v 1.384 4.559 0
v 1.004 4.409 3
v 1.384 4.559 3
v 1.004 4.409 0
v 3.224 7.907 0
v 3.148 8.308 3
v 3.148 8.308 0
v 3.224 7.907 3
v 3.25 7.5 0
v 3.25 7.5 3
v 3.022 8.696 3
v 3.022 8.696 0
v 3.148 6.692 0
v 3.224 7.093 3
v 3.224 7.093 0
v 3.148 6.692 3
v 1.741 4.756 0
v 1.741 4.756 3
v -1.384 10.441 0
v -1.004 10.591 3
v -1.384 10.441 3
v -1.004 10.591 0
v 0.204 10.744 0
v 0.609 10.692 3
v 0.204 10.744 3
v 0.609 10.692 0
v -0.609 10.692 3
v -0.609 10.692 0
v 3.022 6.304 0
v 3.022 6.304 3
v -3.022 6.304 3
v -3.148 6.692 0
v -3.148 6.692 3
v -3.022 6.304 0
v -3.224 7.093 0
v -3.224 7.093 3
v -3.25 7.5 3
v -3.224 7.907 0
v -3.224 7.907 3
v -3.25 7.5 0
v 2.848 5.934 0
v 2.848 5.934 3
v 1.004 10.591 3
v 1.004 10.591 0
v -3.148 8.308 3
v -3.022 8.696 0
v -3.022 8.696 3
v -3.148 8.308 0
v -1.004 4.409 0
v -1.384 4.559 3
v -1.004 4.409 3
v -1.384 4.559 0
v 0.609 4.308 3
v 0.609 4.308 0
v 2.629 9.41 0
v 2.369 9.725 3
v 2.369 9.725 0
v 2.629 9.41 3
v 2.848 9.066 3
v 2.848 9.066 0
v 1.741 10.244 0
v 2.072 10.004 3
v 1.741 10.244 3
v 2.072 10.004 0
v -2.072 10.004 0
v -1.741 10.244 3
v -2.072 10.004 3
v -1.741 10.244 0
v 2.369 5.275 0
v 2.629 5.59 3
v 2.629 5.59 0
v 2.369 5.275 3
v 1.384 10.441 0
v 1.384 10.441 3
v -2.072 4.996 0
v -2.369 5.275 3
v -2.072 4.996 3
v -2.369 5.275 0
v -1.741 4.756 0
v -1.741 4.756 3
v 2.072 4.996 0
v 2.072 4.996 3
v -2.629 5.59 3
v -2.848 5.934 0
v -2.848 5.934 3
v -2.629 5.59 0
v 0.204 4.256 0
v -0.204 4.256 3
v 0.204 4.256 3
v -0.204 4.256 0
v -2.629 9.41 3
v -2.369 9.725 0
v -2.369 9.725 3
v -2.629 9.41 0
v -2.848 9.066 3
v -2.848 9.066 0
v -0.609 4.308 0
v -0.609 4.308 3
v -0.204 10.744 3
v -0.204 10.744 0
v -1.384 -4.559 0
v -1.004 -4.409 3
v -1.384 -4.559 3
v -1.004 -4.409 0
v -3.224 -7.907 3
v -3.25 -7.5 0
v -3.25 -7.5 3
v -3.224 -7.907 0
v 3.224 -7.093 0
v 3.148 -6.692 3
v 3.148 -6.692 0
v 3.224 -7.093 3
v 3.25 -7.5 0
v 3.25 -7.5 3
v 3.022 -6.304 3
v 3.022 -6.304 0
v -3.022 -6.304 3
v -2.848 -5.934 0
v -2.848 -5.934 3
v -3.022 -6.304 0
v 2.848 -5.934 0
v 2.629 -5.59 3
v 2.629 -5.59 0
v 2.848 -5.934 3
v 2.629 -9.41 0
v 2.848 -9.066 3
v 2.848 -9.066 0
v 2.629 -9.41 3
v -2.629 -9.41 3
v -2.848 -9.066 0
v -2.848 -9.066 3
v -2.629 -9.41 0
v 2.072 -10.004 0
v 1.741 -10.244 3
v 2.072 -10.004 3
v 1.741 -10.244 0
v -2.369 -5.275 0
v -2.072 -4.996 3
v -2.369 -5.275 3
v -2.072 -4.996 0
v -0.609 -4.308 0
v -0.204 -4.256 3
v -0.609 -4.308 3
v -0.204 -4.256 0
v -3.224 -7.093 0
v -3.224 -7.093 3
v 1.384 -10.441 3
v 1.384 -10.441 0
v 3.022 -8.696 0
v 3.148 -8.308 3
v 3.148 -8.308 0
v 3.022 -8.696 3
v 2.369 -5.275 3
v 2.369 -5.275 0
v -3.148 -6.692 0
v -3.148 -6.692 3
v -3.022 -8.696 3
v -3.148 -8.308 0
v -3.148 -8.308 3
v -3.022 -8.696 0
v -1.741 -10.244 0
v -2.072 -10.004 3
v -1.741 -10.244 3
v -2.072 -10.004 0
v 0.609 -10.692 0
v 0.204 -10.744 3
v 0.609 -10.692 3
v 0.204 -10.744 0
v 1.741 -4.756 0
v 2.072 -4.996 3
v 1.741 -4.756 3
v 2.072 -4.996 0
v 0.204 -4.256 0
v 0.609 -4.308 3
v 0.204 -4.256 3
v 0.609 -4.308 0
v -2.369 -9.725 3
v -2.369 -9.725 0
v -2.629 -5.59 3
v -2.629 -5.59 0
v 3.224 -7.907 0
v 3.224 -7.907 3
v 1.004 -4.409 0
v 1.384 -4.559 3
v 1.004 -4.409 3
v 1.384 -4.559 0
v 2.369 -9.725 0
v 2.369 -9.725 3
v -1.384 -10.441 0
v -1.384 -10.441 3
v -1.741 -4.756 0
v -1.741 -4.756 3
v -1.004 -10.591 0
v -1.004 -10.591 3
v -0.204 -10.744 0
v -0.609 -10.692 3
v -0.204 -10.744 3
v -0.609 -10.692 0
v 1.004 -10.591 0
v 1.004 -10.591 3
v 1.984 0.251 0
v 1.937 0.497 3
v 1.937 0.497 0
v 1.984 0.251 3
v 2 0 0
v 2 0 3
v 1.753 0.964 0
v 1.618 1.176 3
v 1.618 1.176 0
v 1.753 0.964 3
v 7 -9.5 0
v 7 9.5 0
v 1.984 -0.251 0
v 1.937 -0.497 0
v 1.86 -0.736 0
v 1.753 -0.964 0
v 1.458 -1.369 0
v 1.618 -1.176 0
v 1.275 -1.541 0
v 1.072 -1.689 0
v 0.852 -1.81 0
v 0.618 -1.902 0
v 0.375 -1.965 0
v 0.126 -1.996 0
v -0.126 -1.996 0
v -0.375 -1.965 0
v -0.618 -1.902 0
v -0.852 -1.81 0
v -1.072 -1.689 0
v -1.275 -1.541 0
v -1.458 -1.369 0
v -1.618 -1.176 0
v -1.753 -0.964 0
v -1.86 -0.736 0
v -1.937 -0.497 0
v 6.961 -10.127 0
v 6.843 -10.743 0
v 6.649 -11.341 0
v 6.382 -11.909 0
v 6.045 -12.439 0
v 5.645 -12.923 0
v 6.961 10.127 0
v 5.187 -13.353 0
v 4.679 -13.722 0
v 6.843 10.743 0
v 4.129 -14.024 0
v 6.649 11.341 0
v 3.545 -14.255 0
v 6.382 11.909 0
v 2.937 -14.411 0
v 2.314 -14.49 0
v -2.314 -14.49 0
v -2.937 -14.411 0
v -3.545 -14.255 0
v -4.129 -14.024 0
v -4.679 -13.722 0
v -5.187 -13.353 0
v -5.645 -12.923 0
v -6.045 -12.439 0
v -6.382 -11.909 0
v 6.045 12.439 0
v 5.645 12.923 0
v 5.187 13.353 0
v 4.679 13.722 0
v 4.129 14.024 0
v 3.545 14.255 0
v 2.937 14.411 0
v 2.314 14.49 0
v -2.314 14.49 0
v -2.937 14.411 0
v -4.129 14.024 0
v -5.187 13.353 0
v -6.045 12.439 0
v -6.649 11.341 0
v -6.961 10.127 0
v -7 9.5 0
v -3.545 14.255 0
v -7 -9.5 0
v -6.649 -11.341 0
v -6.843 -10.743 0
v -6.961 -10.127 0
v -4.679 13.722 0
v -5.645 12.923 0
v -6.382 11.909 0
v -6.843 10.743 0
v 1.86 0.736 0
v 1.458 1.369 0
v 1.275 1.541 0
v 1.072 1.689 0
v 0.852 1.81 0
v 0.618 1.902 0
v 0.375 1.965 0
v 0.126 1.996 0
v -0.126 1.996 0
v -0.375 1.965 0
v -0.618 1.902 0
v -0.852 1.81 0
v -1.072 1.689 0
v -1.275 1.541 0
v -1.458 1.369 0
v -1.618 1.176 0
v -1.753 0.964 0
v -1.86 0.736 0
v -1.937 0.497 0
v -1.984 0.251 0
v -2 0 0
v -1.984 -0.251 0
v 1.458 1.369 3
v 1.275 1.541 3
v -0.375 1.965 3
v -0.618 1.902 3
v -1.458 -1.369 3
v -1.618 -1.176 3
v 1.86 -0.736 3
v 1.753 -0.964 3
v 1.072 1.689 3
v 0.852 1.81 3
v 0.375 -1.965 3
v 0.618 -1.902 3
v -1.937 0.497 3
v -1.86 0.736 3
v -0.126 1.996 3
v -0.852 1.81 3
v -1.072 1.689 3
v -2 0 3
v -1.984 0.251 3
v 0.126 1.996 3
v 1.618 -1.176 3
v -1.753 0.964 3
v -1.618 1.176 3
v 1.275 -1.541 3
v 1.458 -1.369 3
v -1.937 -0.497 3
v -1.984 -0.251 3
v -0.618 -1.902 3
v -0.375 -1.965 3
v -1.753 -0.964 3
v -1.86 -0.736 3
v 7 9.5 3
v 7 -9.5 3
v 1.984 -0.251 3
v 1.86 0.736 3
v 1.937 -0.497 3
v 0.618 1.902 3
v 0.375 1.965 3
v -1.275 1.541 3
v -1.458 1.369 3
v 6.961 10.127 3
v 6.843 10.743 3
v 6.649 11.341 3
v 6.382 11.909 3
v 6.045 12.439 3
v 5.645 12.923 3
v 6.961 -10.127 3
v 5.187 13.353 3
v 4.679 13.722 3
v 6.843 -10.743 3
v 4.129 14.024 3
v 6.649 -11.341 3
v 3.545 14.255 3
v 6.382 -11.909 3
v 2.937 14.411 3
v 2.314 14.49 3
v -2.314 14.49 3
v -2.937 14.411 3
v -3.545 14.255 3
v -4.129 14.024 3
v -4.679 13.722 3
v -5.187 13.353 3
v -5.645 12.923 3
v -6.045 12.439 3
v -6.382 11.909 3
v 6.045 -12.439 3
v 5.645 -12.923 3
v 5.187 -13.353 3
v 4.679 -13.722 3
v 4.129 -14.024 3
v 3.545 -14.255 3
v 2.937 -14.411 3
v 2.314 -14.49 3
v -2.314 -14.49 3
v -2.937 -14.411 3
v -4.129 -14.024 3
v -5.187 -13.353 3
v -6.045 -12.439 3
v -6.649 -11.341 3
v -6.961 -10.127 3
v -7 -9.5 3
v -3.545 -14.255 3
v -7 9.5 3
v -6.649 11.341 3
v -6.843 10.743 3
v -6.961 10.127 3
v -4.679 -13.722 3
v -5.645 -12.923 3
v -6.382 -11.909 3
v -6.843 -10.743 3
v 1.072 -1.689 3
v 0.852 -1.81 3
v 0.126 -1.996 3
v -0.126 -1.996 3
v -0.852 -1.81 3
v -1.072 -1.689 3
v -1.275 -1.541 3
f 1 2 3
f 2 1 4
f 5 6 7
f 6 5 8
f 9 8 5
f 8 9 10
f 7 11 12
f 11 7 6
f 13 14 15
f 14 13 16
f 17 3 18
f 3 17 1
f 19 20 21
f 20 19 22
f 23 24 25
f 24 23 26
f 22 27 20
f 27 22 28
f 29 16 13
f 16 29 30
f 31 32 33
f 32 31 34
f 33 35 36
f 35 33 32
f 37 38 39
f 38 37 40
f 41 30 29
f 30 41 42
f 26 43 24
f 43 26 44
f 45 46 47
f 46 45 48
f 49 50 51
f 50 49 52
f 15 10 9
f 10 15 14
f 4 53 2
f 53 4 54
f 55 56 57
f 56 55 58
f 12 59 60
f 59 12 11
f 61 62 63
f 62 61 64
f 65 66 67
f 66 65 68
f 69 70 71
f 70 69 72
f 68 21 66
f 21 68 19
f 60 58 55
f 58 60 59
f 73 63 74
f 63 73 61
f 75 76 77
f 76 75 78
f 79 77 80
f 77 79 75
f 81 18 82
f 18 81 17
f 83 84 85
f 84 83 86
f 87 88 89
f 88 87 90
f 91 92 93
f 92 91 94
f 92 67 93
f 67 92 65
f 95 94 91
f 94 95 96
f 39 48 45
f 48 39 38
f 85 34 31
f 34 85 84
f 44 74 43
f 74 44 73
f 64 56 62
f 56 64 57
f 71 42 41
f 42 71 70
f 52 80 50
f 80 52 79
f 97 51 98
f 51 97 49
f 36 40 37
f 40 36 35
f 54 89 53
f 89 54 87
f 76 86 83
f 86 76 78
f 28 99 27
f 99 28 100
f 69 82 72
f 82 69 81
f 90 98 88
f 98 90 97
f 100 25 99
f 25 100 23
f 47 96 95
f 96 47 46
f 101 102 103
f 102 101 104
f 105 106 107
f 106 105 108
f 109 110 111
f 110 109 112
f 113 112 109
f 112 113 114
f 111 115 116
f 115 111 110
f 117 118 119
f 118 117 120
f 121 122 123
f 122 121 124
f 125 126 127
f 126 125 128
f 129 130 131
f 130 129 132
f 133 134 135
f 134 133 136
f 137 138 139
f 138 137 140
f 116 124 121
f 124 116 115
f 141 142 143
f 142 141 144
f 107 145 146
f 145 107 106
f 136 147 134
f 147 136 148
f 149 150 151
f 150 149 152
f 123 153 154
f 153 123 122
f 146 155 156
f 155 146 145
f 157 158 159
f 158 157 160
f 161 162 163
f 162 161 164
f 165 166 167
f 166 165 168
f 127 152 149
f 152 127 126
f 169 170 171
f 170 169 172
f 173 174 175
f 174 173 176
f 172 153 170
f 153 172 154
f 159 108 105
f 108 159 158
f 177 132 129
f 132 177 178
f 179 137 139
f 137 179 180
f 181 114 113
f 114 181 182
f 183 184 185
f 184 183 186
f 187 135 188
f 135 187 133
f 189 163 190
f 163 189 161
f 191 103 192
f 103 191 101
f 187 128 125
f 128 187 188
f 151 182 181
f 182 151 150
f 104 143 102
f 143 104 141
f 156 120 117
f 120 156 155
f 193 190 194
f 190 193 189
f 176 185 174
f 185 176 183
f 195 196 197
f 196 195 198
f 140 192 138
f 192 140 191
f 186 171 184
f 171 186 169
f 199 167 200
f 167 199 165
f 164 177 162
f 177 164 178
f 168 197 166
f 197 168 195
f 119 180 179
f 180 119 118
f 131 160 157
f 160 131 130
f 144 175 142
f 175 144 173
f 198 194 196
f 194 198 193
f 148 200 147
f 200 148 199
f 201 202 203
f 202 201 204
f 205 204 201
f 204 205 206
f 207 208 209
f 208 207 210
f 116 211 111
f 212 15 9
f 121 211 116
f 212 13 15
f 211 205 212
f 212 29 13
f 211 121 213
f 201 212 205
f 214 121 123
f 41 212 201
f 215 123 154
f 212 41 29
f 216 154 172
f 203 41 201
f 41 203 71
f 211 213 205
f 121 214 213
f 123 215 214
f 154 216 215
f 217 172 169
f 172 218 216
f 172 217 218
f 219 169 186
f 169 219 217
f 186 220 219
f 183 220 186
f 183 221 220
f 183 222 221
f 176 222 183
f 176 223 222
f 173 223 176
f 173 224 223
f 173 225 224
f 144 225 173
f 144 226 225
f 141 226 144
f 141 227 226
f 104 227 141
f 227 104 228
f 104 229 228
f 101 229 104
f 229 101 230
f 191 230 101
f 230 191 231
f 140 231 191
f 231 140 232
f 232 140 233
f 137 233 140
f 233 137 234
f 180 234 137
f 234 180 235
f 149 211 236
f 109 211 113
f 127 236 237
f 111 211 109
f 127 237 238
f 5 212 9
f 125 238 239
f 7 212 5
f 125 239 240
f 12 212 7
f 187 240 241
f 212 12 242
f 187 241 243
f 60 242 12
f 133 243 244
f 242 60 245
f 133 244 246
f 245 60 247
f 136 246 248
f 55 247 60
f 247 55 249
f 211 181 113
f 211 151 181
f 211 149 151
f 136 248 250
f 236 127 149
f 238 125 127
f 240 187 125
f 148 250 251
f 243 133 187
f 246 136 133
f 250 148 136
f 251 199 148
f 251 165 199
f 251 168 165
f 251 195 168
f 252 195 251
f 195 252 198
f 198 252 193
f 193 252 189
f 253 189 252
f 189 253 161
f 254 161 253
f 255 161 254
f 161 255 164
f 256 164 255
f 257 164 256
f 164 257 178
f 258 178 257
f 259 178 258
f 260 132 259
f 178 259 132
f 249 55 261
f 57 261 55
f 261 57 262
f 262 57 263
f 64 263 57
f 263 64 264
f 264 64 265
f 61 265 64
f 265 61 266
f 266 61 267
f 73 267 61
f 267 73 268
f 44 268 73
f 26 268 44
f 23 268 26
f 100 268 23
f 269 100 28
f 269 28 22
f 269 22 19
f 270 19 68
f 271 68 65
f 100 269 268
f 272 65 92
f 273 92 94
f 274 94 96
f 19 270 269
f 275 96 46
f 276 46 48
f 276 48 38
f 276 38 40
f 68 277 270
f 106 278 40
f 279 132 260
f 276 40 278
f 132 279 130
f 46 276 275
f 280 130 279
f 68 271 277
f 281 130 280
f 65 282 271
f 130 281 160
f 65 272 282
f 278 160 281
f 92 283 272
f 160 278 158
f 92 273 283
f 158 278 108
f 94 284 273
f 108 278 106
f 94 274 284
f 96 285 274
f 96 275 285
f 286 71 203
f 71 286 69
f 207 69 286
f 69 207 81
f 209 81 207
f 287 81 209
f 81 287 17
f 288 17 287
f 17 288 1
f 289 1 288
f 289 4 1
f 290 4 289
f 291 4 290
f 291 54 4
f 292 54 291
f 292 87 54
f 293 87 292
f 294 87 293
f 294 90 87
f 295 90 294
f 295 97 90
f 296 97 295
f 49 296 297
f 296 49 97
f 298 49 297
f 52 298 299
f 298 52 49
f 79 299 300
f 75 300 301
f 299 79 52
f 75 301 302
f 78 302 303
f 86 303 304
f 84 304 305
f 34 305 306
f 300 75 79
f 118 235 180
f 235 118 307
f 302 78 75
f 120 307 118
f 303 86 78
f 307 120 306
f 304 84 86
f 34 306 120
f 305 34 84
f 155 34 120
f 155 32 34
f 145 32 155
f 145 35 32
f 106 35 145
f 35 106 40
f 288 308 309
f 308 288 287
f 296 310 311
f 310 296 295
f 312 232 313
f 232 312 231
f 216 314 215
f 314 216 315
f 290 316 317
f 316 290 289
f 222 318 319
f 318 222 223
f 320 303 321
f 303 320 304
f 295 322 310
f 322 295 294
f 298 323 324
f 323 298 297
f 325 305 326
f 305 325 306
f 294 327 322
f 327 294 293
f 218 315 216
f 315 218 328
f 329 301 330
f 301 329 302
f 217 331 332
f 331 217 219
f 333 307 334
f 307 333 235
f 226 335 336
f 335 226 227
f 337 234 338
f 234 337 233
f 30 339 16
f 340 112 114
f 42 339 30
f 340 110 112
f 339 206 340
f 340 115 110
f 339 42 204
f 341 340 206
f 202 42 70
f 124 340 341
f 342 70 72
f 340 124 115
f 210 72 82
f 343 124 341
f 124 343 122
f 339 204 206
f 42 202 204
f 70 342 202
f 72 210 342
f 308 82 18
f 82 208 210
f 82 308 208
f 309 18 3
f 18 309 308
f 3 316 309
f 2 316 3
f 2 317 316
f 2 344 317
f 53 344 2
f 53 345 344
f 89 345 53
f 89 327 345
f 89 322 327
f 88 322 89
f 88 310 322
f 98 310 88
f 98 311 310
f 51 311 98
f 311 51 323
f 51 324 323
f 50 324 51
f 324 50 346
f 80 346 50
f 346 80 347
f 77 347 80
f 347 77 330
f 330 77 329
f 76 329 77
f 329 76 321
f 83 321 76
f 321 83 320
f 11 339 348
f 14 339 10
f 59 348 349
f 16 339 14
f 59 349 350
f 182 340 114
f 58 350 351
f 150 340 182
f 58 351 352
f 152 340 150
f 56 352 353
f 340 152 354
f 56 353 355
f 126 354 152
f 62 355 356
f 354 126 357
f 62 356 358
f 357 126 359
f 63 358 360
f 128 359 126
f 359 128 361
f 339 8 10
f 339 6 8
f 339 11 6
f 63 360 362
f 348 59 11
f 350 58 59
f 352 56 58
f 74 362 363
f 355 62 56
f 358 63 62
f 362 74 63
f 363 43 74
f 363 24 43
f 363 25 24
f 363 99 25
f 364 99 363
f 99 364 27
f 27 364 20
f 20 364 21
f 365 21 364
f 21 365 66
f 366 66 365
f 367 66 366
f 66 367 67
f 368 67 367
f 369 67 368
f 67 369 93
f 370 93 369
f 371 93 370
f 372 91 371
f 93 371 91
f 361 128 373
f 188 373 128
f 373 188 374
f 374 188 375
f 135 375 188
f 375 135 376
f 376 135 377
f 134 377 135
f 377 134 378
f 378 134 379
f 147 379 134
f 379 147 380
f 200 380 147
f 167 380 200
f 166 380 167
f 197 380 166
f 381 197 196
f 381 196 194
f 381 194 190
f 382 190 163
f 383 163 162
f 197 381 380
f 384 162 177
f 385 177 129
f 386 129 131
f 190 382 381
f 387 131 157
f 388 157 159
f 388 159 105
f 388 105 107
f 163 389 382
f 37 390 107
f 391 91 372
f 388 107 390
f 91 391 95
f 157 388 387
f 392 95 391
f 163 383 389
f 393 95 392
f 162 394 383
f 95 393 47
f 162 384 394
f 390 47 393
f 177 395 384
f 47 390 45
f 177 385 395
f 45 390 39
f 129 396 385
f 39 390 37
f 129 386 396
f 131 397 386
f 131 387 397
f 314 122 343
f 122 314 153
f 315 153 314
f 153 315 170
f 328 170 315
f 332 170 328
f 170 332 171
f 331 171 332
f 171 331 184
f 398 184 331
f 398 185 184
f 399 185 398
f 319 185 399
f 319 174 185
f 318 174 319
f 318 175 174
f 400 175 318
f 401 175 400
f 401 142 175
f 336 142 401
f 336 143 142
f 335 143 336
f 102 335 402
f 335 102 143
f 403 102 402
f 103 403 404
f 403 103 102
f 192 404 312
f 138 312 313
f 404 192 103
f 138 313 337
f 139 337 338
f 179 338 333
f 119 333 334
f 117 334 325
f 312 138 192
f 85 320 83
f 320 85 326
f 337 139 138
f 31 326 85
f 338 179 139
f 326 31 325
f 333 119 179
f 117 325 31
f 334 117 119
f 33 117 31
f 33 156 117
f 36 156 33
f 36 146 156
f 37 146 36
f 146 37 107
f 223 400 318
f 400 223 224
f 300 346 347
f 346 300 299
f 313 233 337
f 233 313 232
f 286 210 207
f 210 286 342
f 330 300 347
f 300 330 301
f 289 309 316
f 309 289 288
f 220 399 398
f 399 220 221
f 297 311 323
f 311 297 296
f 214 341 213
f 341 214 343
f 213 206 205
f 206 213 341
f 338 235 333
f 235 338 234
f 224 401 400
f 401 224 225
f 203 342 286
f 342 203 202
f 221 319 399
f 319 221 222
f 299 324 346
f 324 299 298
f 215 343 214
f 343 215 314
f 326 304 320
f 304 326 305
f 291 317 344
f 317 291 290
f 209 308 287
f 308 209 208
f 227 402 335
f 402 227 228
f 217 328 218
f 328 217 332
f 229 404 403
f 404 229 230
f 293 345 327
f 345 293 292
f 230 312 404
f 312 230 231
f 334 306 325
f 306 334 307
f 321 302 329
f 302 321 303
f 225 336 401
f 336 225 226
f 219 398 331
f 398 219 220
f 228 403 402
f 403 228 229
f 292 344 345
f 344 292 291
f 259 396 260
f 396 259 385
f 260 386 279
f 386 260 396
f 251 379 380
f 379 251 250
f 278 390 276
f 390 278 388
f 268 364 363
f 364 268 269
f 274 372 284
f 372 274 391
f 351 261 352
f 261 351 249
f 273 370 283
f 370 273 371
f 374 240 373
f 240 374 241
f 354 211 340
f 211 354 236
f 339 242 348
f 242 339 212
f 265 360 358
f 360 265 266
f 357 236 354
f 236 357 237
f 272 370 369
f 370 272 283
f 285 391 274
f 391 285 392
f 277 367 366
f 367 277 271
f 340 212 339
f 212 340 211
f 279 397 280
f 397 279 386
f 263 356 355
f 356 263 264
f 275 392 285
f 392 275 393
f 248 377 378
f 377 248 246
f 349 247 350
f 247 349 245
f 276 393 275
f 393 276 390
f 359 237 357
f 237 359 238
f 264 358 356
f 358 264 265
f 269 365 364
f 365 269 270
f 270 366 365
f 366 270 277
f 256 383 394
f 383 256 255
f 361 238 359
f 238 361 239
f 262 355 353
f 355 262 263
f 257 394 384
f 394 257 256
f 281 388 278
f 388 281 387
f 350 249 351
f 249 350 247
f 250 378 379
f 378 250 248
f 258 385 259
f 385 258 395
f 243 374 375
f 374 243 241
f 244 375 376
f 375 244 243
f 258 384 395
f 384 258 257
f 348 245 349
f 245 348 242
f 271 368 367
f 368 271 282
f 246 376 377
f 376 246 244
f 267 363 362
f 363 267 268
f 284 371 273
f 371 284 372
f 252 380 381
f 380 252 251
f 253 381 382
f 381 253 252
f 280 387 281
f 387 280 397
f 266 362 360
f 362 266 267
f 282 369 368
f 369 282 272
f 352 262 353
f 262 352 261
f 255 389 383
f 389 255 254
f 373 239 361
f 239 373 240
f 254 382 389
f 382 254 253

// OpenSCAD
$fn = 50;


difference() {
	union() {
		hull() {
			translate(v = [-2.0000000000, 9.5000000000, 0]) {
				cylinder(h = 3, r = 5);
			}
			translate(v = [2.0000000000, 9.5000000000, 0]) {
				cylinder(h = 3, r = 5);
			}
			translate(v = [-2.0000000000, -9.5000000000, 0]) {
				cylinder(h = 3, r = 5);
			}
			translate(v = [2.0000000000, -9.5000000000, 0]) {
				cylinder(h = 3, r = 5);
			}
		}
	}
	union() {
		#translate(v = [0.0000000000, 7.5000000000, 0]) {
			cylinder(h = 3, r = 3.2500000000);
		}
		#translate(v = [0.0000000000, -7.5000000000, 0]) {
			cylinder(h = 3, r = 3.2500000000);
		}
		#translate(v = [0.0000000000, -7.5000000000, -100.0000000000]) {
			cylinder(h = 200, r = 3.2500000000);
		}
		#translate(v = [0.0000000000, -7.5000000000, -100.0000000000]) {
			cylinder(h = 200, r = 3.2500000000);
		}
		#translate(v = [0.0000000000, 7.5000000000, -100.0000000000]) {
			cylinder(h = 200, r = 3.2500000000);
		}
		#translate(v = [0.0000000000, 7.5000000000, -100.0000000000]) {
			cylinder(h = 200, r = 3.2500000000);
		}
		#translate(v = [0.0000000000, 7.5000000000, 0]) {
			cylinder(h = 3, r = 1.8000000000);
		}
		#translate(v = [0.0000000000, -7.5000000000, 0]) {
			cylinder(h = 3, r = 1.8000000000);
		}
		#translate(v = [0.0000000000, 7.5000000000, 0]) {
			cylinder(h = 3, r = 1.8000000000);
		}
		#translate(v = [0.0000000000, -7.5000000000, 0]) {
			cylinder(h = 3, r = 1.8000000000);
		}
		#translate(v = [0.0000000000, 7.5000000000, 0]) {
			cylinder(h = 3, r = 1.8000000000);
		}
		#translate(v = [0.0000000000, -7.5000000000, 0]) {
			cylinder(h = 3, r = 1.8000000000);
		}
		#cylinder(h = 3, r = 2.0000000000);
	}
}
